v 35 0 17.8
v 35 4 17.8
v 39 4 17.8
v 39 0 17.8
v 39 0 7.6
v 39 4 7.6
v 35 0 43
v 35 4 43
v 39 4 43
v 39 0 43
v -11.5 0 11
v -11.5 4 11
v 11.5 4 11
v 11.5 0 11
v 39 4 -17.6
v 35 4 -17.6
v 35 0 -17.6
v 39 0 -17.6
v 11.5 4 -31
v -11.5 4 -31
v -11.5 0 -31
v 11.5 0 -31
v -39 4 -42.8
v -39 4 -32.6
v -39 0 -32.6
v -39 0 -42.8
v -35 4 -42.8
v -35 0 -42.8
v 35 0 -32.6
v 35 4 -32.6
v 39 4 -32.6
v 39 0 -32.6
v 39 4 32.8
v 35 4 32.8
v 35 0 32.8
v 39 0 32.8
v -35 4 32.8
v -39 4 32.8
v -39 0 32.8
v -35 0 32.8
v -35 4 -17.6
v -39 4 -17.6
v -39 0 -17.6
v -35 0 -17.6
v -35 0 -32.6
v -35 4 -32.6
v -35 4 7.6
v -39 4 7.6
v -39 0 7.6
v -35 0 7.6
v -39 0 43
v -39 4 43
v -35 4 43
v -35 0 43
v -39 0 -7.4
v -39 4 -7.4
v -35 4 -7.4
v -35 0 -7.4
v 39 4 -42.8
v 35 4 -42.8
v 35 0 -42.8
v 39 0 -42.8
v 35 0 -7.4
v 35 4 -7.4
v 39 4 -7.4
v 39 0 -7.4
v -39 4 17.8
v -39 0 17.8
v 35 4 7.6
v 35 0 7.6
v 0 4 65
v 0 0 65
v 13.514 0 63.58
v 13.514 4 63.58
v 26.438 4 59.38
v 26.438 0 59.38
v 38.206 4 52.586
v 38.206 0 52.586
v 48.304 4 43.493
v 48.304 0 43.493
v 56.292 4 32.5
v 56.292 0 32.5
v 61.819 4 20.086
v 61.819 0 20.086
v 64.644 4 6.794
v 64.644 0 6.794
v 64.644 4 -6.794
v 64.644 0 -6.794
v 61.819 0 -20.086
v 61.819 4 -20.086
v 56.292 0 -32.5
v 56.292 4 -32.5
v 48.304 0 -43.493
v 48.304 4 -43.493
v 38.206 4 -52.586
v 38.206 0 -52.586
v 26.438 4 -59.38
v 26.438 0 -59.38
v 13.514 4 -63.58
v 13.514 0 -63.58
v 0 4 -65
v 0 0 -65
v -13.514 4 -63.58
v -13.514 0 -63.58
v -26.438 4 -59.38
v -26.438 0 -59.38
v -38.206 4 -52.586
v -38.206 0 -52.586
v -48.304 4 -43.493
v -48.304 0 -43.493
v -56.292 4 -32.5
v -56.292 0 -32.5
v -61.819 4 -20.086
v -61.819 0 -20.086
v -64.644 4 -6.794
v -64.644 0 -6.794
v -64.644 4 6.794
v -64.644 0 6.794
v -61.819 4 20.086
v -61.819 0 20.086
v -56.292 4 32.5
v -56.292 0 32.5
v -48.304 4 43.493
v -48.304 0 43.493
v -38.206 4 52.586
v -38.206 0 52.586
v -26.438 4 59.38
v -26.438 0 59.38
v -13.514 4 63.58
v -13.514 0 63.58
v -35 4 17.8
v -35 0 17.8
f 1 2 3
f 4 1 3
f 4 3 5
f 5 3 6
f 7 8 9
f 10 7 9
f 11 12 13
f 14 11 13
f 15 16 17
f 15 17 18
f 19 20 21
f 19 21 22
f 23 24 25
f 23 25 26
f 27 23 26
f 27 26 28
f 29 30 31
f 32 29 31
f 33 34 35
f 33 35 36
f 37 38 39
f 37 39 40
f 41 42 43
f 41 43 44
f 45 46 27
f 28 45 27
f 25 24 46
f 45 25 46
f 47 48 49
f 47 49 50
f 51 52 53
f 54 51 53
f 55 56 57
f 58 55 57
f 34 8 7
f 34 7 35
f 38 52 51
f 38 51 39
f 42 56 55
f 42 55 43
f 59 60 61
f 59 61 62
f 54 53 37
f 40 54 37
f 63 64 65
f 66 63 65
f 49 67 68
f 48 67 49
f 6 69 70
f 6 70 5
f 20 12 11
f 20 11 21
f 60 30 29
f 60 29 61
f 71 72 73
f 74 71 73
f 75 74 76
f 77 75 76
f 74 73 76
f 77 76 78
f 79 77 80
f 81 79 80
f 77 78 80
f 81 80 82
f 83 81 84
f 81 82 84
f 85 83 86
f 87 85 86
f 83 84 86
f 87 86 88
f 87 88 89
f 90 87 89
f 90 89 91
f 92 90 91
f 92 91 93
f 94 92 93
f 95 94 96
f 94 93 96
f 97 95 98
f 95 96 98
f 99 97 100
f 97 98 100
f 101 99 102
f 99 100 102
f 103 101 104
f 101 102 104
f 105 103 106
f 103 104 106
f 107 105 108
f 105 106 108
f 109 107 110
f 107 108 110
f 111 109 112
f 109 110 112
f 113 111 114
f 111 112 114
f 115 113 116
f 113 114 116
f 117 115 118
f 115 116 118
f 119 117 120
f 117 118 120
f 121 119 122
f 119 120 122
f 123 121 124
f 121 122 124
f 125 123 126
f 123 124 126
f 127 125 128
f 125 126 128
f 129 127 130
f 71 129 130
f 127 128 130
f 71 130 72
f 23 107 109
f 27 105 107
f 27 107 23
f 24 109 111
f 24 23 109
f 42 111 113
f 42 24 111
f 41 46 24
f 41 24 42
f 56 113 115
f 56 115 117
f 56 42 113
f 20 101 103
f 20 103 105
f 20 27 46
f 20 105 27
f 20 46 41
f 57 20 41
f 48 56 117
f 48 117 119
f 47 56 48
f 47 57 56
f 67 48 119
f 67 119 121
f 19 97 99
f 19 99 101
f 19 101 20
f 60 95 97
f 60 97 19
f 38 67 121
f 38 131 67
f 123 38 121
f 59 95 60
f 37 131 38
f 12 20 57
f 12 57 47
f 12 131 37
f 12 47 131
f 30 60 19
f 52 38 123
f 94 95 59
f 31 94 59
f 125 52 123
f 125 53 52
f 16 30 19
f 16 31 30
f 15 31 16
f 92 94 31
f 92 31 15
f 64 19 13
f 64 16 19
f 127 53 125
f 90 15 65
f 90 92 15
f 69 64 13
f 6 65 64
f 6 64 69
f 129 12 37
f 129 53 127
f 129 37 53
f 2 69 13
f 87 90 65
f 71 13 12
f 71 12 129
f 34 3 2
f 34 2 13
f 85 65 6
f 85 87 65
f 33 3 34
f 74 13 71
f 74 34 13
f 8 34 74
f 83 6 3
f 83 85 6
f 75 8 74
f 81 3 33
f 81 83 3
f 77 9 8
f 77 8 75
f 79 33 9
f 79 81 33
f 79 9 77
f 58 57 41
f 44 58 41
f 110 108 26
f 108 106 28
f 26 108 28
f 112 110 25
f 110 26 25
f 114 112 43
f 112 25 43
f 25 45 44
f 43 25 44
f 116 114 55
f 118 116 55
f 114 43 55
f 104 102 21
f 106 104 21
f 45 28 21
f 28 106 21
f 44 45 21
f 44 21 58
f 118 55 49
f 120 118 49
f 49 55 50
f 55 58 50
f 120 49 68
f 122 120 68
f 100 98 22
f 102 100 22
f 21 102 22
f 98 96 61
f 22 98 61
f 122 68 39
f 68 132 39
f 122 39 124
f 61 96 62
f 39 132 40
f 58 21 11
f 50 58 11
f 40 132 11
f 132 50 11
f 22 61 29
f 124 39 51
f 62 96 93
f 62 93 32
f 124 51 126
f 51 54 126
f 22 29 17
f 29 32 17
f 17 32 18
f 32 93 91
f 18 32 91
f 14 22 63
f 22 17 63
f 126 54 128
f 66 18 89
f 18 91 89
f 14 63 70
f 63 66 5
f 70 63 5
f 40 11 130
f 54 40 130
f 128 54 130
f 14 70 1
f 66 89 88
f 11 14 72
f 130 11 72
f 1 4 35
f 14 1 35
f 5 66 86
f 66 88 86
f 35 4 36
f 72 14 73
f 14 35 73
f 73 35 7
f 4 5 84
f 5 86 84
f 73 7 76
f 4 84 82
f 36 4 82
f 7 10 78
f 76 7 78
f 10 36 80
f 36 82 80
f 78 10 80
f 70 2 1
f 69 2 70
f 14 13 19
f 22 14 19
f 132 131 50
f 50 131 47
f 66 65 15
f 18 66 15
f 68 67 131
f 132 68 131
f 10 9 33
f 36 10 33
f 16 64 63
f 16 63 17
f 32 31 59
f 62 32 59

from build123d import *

# Parameters (mm, degrees)
CROQUIS2_R              = 65
SALIENTE_EXTRUIR1_DEPTH = 4
CORTAR_EXTRUIR6_REACH   = 94.011
CROQUIS3_W              = 4
CROQUIS3_H              = 10.2
CROQUIS4_W              = 23
CROQUIS4_H              = 42
CORTAR_EXTRUIR8_DEPTH   = 10


with BuildPart() as part:
    # Croquis2 → Saliente-Extruir1 (new body)
    with BuildSketch(Plane(origin=(0, 0, 0), x_dir=(1, 0, 0), z_dir=(0, 1, 0))):
        with Locations(Location((0, 0, 0), (0, 0, 270))):
            Circle(CROQUIS2_R)
    extrude(amount=SALIENTE_EXTRUIR1_DEPTH)

    # Croquis3 → Cortar-Extruir6 (cut, up to next)
    with BuildSketch(Plane(origin=(0, 4, 0), x_dir=(1, 0, 0), z_dir=(0, 1, 0)), mode=Mode.PRIVATE) as cortar_extruir6_sk1:
        with Locations((-37, 12.5)):
            Rectangle(CROQUIS3_W, CROQUIS3_H)
    cortar_extruir6_tool1 = extrude(cortar_extruir6_sk1.sketch, amount=-CORTAR_EXTRUIR6_REACH, mode=Mode.PRIVATE) & part.part
    # Croquis3 → Cortar-Extruir6 (cut, up to next)
    with BuildSketch(Plane(origin=(0, 4, 0), x_dir=(1, 0, 0), z_dir=(0, 1, 0)), mode=Mode.PRIVATE) as cortar_extruir6_sk2:
        with Locations((-37, -12.7)):
            Rectangle(CROQUIS3_W, CROQUIS3_H)
    cortar_extruir6_tool2 = extrude(cortar_extruir6_sk2.sketch, amount=-CORTAR_EXTRUIR6_REACH, mode=Mode.PRIVATE) & part.part
    # Croquis3 → Cortar-Extruir6 (cut, up to next)
    with BuildSketch(Plane(origin=(0, 4, 0), x_dir=(1, 0, 0), z_dir=(0, 1, 0)), mode=Mode.PRIVATE) as cortar_extruir6_sk3:
        with Locations((-37, -37.9)):
            Rectangle(CROQUIS3_W, CROQUIS3_H)
    cortar_extruir6_tool3 = extrude(cortar_extruir6_sk3.sketch, amount=-CORTAR_EXTRUIR6_REACH, mode=Mode.PRIVATE) & part.part
    # Croquis3 → Cortar-Extruir6 (cut, up to next)
    with BuildSketch(Plane(origin=(0, 4, 0), x_dir=(1, 0, 0), z_dir=(0, 1, 0)), mode=Mode.PRIVATE) as cortar_extruir6_sk4:
        with Locations((-37, 37.7)):
            Rectangle(CROQUIS3_W, CROQUIS3_H)
    cortar_extruir6_tool4 = extrude(cortar_extruir6_sk4.sketch, amount=-CORTAR_EXTRUIR6_REACH, mode=Mode.PRIVATE) & part.part
    # Croquis3 → Cortar-Extruir6 (cut, up to next)
    with BuildSketch(Plane(origin=(0, 4, 0), x_dir=(1, 0, 0), z_dir=(0, 1, 0)), mode=Mode.PRIVATE) as cortar_extruir6_sk5:
        with Locations((37, 37.7)):
            Rectangle(CROQUIS3_W, CROQUIS3_H)
    cortar_extruir6_tool5 = extrude(cortar_extruir6_sk5.sketch, amount=-CORTAR_EXTRUIR6_REACH, mode=Mode.PRIVATE) & part.part
    # Croquis3 → Cortar-Extruir6 (cut, up to next)
    with BuildSketch(Plane(origin=(0, 4, 0), x_dir=(1, 0, 0), z_dir=(0, 1, 0)), mode=Mode.PRIVATE) as cortar_extruir6_sk6:
        with Locations((37, 12.5)):
            Rectangle(CROQUIS3_W, CROQUIS3_H)
    cortar_extruir6_tool6 = extrude(cortar_extruir6_sk6.sketch, amount=-CORTAR_EXTRUIR6_REACH, mode=Mode.PRIVATE) & part.part
    # Croquis3 → Cortar-Extruir6 (cut, up to next)
    with BuildSketch(Plane(origin=(0, 4, 0), x_dir=(1, 0, 0), z_dir=(0, 1, 0)), mode=Mode.PRIVATE) as cortar_extruir6_sk7:
        with Locations((37, -12.7)):
            Rectangle(CROQUIS3_W, CROQUIS3_H)
    cortar_extruir6_tool7 = extrude(cortar_extruir6_sk7.sketch, amount=-CORTAR_EXTRUIR6_REACH, mode=Mode.PRIVATE) & part.part
    # Croquis3 → Cortar-Extruir6 (cut, up to next)
    with BuildSketch(Plane(origin=(0, 4, 0), x_dir=(1, 0, 0), z_dir=(0, 1, 0)), mode=Mode.PRIVATE) as cortar_extruir6_sk8:
        with Locations((37, -37.9)):
            Rectangle(CROQUIS3_W, CROQUIS3_H)
    cortar_extruir6_tool8 = extrude(cortar_extruir6_sk8.sketch, amount=-CORTAR_EXTRUIR6_REACH, mode=Mode.PRIVATE) & part.part
    add(cortar_extruir6_tool1.solids().sort_by_distance((-37, 4, -12.5))[0], mode=Mode.SUBTRACT)
    add(cortar_extruir6_tool2.solids().sort_by_distance((-37, 4, 12.7))[0], mode=Mode.SUBTRACT)
    add(cortar_extruir6_tool3.solids().sort_by_distance((-37, 4, 37.9))[0], mode=Mode.SUBTRACT)
    add(cortar_extruir6_tool4.solids().sort_by_distance((-37, 4, -37.7))[0], mode=Mode.SUBTRACT)
    add(cortar_extruir6_tool5.solids().sort_by_distance((37, 4, -37.7))[0], mode=Mode.SUBTRACT)
    add(cortar_extruir6_tool6.solids().sort_by_distance((37, 4, -12.5))[0], mode=Mode.SUBTRACT)
    add(cortar_extruir6_tool7.solids().sort_by_distance((37, 4, 12.7))[0], mode=Mode.SUBTRACT)
    add(cortar_extruir6_tool8.solids().sort_by_distance((37, 4, 37.9))[0], mode=Mode.SUBTRACT)

    # Croquis4 → Cortar-Extruir8 (cut)
    with BuildSketch(Plane(origin=(0, 4, 0), x_dir=(1, 0, 0), z_dir=(0, 1, 0))):
        with Locations((0, 10)):
            Rectangle(CROQUIS4_W, CROQUIS4_H)
    extrude(amount=-CORTAR_EXTRUIR8_DEPTH, mode=Mode.SUBTRACT)


solid = part.part
